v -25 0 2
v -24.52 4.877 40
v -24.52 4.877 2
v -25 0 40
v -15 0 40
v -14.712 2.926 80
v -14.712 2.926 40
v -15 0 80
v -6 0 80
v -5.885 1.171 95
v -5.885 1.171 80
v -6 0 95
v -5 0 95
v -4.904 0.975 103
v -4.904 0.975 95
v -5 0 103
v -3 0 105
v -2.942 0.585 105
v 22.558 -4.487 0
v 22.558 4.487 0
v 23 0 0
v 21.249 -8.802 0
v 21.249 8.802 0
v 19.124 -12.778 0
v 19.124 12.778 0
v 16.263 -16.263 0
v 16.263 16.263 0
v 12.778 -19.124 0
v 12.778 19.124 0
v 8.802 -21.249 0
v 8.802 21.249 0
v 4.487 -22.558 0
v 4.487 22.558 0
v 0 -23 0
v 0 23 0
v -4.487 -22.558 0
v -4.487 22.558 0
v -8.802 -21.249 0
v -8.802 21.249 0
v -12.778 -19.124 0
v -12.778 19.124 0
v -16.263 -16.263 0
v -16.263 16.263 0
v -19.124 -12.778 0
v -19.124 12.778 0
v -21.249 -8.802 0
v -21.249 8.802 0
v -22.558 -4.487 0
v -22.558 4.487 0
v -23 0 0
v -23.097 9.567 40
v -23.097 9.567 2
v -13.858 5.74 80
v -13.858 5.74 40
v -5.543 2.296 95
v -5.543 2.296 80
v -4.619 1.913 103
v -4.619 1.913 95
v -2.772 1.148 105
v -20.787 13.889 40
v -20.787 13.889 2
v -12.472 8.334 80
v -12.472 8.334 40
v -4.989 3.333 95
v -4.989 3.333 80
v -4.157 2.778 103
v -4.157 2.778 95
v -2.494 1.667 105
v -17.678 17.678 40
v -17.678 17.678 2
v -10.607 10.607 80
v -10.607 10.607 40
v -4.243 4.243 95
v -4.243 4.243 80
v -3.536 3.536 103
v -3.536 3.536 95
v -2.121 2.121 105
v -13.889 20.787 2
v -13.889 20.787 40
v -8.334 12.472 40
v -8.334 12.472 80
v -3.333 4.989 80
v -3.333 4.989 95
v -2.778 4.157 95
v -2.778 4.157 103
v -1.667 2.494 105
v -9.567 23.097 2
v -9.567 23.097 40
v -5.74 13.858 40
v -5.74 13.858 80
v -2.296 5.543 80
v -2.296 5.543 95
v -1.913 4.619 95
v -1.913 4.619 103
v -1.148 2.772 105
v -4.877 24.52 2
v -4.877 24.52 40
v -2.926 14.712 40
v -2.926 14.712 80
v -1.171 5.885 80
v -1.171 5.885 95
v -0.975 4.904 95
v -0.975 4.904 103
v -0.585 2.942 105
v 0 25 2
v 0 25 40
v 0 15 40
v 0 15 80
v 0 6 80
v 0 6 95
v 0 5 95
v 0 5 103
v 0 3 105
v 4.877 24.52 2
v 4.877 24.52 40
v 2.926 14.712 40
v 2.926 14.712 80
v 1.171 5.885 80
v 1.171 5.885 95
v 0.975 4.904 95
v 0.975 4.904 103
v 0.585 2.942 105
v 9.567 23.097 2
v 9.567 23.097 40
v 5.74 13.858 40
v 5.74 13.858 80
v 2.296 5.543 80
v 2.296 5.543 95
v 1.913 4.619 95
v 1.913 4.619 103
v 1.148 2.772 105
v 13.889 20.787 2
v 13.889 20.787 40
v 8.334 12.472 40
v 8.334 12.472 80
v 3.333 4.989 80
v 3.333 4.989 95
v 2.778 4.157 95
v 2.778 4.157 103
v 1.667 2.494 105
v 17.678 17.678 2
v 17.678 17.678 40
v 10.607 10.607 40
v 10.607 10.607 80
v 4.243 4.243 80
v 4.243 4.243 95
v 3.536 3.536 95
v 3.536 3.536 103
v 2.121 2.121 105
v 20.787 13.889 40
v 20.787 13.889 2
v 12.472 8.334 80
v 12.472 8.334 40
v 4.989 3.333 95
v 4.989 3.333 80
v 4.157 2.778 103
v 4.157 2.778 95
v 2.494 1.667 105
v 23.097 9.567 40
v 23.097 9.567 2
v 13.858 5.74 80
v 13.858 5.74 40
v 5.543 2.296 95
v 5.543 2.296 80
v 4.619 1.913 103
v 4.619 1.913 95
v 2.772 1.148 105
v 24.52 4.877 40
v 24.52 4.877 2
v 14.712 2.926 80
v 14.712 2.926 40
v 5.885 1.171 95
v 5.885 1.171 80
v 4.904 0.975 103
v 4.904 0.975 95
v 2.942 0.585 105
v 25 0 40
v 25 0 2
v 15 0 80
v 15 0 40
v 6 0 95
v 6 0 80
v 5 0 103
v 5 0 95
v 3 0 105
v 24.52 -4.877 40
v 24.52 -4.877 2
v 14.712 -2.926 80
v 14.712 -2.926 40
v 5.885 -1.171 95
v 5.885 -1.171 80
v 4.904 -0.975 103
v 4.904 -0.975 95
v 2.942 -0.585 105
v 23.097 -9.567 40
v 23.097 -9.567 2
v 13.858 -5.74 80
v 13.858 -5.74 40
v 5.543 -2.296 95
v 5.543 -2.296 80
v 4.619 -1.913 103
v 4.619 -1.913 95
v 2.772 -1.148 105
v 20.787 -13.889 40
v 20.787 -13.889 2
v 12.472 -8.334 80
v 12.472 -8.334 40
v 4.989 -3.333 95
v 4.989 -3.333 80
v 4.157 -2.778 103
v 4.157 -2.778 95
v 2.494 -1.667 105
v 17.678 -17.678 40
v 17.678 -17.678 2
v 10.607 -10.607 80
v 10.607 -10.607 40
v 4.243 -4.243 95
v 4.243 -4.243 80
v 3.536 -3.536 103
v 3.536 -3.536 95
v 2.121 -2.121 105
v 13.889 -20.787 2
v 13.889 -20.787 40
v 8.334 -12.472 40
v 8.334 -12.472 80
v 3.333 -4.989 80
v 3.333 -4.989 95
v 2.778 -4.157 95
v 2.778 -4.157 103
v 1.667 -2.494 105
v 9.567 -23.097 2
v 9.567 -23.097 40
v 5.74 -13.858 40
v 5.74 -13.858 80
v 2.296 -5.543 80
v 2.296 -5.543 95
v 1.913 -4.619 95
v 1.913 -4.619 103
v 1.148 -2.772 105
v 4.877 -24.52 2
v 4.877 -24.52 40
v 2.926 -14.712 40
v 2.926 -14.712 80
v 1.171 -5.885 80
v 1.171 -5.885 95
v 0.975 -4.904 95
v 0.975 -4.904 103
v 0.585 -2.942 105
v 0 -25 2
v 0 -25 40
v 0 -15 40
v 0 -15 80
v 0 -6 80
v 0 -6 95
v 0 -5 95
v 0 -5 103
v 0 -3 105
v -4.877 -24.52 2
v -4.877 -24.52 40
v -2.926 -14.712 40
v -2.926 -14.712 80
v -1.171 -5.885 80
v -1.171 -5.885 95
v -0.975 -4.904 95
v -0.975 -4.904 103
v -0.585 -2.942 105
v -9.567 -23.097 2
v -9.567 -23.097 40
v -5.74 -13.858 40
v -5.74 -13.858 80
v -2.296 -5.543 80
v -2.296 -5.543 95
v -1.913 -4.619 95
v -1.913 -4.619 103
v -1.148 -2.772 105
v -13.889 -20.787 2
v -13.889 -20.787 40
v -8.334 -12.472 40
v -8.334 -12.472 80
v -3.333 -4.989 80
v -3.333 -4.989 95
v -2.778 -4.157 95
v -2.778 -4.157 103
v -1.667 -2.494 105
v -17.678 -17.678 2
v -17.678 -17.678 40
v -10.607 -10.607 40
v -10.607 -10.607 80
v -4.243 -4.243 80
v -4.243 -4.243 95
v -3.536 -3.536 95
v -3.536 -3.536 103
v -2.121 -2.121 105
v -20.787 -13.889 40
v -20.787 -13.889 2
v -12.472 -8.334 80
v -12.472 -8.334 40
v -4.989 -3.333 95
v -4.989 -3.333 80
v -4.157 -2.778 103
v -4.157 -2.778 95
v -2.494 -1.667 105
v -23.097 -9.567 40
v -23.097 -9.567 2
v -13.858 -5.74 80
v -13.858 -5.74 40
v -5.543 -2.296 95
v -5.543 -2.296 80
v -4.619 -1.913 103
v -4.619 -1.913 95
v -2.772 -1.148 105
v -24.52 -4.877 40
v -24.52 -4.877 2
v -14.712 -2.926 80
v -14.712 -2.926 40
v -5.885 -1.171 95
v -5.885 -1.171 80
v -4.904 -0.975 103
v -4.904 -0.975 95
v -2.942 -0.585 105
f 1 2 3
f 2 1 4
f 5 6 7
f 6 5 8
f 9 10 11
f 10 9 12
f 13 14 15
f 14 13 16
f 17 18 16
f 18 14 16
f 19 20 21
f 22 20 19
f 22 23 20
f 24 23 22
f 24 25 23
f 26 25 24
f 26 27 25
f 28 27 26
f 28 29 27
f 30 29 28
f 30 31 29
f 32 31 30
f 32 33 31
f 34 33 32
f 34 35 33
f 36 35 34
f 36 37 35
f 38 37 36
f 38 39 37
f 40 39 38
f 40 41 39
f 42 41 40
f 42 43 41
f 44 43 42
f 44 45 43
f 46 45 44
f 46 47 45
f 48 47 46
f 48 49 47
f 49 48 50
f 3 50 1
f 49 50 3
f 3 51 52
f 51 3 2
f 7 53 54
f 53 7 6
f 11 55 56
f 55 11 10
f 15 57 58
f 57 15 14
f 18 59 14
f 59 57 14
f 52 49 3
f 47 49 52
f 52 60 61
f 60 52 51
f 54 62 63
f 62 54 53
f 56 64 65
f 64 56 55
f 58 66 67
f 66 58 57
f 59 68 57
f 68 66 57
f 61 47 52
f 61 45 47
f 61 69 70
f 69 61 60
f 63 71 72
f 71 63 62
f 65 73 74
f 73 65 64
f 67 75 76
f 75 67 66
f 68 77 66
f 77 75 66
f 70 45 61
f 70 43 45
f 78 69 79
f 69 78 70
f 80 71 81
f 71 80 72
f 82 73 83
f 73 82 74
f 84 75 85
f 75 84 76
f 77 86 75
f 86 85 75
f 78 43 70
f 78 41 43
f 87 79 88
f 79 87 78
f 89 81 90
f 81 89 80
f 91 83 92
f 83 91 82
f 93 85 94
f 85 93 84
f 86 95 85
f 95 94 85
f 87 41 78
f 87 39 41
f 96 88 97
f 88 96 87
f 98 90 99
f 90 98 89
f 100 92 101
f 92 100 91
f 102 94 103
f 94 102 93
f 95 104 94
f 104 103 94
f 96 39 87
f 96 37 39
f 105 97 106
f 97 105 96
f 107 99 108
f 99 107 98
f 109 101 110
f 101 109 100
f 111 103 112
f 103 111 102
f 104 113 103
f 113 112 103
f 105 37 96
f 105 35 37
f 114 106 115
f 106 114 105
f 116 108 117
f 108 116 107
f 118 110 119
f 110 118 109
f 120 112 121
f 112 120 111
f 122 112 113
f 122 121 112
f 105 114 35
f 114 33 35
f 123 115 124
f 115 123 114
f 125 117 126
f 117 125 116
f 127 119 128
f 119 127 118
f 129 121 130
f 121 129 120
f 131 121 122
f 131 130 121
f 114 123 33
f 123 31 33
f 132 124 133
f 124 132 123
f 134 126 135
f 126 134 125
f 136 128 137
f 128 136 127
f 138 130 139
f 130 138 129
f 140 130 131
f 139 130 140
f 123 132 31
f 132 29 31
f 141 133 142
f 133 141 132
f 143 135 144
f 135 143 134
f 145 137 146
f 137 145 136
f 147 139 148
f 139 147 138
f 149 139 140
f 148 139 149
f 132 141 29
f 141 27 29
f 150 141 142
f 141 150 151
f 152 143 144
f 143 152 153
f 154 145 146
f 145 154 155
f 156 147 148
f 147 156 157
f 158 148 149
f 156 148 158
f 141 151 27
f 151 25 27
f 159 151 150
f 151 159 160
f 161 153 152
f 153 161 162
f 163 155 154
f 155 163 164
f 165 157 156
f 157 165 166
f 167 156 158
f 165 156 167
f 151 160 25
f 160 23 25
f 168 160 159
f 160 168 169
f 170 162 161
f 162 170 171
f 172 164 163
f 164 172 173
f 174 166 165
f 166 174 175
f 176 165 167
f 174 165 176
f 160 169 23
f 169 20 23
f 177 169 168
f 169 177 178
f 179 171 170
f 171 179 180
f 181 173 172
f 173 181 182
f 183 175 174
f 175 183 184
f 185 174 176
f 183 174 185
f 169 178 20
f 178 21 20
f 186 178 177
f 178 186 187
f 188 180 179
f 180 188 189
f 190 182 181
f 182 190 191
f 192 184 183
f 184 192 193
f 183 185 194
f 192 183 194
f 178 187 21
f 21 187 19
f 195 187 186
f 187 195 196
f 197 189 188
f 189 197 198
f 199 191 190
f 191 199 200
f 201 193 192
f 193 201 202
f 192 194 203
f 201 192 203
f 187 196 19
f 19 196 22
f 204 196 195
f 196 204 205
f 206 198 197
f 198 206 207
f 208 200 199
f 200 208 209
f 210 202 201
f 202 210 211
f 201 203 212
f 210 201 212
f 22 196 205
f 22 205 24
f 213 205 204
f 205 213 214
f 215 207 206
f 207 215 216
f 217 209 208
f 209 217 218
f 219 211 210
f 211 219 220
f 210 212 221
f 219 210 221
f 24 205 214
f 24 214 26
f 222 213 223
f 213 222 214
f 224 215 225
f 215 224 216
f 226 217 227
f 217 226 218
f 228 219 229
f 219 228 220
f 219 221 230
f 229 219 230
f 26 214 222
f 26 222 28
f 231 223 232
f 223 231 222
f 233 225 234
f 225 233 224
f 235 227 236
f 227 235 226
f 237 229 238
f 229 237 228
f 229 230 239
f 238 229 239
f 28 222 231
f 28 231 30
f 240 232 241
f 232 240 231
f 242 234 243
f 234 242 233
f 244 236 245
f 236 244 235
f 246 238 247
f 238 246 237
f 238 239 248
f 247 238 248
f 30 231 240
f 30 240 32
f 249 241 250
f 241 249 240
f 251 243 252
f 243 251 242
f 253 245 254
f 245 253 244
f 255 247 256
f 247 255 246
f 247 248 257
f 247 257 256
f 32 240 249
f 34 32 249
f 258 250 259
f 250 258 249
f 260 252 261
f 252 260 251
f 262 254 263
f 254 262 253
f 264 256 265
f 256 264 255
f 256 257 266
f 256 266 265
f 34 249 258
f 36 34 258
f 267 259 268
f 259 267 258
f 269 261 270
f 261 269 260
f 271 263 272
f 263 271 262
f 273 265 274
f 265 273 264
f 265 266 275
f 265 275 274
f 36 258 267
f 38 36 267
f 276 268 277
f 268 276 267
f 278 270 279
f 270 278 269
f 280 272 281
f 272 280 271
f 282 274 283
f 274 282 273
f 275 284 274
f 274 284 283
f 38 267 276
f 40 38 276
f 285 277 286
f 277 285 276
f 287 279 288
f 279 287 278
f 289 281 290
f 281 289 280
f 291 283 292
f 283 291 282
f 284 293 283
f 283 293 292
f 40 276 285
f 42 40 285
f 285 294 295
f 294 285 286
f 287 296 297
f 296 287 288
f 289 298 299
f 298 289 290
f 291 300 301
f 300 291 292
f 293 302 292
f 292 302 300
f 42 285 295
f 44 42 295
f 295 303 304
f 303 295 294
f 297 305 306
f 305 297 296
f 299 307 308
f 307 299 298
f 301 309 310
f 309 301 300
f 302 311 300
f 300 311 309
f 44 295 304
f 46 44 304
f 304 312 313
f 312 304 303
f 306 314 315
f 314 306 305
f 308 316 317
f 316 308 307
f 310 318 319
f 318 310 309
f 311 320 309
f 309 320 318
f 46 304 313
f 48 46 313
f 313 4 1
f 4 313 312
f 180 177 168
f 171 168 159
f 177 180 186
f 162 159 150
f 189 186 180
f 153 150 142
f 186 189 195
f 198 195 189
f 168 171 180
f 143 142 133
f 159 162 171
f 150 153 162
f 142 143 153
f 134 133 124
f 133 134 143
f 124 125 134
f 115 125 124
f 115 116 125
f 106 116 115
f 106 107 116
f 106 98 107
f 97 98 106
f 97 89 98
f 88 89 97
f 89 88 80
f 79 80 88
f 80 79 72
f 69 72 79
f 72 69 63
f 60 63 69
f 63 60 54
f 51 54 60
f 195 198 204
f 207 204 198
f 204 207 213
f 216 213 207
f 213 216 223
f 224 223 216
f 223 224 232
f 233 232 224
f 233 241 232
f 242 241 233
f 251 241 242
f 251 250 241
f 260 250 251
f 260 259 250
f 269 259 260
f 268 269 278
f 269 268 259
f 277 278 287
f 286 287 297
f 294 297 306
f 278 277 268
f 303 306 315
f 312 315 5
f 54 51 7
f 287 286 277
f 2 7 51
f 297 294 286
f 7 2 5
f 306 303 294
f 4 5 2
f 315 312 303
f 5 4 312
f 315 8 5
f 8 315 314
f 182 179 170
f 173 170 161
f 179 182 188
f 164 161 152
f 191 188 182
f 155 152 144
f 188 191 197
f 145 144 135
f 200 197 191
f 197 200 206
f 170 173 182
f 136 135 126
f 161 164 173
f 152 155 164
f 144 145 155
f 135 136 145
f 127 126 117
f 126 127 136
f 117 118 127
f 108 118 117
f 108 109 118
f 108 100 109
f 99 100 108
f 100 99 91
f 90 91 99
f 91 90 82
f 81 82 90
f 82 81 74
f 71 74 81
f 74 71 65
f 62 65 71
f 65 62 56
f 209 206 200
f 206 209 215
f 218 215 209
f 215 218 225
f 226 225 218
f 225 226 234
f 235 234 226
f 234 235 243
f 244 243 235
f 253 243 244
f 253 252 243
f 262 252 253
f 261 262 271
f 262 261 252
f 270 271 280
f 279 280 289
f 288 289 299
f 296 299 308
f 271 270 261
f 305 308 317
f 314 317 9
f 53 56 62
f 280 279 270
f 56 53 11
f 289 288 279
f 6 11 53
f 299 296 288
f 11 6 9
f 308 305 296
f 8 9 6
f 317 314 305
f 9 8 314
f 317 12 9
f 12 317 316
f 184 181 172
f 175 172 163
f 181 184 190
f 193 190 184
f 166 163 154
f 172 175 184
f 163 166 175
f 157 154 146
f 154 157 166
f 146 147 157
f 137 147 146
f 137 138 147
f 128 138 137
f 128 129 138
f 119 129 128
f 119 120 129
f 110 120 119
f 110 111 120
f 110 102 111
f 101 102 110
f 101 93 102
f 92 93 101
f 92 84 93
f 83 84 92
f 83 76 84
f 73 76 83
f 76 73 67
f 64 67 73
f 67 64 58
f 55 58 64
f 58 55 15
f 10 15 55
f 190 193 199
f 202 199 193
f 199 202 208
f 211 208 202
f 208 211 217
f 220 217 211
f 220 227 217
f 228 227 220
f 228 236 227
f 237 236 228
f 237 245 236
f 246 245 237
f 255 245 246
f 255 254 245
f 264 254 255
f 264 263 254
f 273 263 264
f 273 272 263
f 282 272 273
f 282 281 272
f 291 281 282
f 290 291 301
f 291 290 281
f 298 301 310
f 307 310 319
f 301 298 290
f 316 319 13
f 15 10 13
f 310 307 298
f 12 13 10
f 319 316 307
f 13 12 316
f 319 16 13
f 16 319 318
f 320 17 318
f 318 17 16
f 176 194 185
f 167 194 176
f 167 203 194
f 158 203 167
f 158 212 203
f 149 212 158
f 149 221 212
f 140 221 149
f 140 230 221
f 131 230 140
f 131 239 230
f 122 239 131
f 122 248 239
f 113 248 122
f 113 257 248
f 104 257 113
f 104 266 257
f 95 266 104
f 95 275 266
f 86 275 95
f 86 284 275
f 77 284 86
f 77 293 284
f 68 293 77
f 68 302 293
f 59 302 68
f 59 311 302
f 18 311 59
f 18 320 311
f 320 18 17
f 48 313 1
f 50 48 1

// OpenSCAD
$fn = 32;

// ----------------------------------------------------------------------
// Stepped shaft: diameters 50, 30, 12, 10 mm, 105 mm long
// ----------------------------------------------------------------------

// --- parameters (mm) ---
d1 = 50;                  // step 1 diameter
len1 = 40;                // step 1 length
d2 = 30;                  // step 2 diameter
len2 = 40;                // step 2 length
d3 = 12;                  // step 3 diameter
len3 = 15;                // step 3 length
d4 = 10;                  // step 4 diameter
len4 = 10;                // step 4 length
total = 105;              // overall length
chamfer = 2;              // end chamfer
key_w = 5;                // keyway width
key_d = 2.5;              // keyway depth
key_len = 20;             // keyway length
key_z = 82;               // keyway start along the shaft

/* closed turning profile: x is the radius, y is the length */
profile = [[0, 0], [25 - chamfer, 0], [25, chamfer], [25, 40], [15, 40], [15, 80], [6, 80], [6, 95], [5, 95], [5, 103], [3, 105], [0, 105]];

difference() {
  rotate_extrude() polygon(profile);
  /* keyway milled into the top of the largest step */
  translate([d1 / 2 - key_d, -key_w / 2, key_z]) cube([key_d + 1, key_w, key_len]);
}
